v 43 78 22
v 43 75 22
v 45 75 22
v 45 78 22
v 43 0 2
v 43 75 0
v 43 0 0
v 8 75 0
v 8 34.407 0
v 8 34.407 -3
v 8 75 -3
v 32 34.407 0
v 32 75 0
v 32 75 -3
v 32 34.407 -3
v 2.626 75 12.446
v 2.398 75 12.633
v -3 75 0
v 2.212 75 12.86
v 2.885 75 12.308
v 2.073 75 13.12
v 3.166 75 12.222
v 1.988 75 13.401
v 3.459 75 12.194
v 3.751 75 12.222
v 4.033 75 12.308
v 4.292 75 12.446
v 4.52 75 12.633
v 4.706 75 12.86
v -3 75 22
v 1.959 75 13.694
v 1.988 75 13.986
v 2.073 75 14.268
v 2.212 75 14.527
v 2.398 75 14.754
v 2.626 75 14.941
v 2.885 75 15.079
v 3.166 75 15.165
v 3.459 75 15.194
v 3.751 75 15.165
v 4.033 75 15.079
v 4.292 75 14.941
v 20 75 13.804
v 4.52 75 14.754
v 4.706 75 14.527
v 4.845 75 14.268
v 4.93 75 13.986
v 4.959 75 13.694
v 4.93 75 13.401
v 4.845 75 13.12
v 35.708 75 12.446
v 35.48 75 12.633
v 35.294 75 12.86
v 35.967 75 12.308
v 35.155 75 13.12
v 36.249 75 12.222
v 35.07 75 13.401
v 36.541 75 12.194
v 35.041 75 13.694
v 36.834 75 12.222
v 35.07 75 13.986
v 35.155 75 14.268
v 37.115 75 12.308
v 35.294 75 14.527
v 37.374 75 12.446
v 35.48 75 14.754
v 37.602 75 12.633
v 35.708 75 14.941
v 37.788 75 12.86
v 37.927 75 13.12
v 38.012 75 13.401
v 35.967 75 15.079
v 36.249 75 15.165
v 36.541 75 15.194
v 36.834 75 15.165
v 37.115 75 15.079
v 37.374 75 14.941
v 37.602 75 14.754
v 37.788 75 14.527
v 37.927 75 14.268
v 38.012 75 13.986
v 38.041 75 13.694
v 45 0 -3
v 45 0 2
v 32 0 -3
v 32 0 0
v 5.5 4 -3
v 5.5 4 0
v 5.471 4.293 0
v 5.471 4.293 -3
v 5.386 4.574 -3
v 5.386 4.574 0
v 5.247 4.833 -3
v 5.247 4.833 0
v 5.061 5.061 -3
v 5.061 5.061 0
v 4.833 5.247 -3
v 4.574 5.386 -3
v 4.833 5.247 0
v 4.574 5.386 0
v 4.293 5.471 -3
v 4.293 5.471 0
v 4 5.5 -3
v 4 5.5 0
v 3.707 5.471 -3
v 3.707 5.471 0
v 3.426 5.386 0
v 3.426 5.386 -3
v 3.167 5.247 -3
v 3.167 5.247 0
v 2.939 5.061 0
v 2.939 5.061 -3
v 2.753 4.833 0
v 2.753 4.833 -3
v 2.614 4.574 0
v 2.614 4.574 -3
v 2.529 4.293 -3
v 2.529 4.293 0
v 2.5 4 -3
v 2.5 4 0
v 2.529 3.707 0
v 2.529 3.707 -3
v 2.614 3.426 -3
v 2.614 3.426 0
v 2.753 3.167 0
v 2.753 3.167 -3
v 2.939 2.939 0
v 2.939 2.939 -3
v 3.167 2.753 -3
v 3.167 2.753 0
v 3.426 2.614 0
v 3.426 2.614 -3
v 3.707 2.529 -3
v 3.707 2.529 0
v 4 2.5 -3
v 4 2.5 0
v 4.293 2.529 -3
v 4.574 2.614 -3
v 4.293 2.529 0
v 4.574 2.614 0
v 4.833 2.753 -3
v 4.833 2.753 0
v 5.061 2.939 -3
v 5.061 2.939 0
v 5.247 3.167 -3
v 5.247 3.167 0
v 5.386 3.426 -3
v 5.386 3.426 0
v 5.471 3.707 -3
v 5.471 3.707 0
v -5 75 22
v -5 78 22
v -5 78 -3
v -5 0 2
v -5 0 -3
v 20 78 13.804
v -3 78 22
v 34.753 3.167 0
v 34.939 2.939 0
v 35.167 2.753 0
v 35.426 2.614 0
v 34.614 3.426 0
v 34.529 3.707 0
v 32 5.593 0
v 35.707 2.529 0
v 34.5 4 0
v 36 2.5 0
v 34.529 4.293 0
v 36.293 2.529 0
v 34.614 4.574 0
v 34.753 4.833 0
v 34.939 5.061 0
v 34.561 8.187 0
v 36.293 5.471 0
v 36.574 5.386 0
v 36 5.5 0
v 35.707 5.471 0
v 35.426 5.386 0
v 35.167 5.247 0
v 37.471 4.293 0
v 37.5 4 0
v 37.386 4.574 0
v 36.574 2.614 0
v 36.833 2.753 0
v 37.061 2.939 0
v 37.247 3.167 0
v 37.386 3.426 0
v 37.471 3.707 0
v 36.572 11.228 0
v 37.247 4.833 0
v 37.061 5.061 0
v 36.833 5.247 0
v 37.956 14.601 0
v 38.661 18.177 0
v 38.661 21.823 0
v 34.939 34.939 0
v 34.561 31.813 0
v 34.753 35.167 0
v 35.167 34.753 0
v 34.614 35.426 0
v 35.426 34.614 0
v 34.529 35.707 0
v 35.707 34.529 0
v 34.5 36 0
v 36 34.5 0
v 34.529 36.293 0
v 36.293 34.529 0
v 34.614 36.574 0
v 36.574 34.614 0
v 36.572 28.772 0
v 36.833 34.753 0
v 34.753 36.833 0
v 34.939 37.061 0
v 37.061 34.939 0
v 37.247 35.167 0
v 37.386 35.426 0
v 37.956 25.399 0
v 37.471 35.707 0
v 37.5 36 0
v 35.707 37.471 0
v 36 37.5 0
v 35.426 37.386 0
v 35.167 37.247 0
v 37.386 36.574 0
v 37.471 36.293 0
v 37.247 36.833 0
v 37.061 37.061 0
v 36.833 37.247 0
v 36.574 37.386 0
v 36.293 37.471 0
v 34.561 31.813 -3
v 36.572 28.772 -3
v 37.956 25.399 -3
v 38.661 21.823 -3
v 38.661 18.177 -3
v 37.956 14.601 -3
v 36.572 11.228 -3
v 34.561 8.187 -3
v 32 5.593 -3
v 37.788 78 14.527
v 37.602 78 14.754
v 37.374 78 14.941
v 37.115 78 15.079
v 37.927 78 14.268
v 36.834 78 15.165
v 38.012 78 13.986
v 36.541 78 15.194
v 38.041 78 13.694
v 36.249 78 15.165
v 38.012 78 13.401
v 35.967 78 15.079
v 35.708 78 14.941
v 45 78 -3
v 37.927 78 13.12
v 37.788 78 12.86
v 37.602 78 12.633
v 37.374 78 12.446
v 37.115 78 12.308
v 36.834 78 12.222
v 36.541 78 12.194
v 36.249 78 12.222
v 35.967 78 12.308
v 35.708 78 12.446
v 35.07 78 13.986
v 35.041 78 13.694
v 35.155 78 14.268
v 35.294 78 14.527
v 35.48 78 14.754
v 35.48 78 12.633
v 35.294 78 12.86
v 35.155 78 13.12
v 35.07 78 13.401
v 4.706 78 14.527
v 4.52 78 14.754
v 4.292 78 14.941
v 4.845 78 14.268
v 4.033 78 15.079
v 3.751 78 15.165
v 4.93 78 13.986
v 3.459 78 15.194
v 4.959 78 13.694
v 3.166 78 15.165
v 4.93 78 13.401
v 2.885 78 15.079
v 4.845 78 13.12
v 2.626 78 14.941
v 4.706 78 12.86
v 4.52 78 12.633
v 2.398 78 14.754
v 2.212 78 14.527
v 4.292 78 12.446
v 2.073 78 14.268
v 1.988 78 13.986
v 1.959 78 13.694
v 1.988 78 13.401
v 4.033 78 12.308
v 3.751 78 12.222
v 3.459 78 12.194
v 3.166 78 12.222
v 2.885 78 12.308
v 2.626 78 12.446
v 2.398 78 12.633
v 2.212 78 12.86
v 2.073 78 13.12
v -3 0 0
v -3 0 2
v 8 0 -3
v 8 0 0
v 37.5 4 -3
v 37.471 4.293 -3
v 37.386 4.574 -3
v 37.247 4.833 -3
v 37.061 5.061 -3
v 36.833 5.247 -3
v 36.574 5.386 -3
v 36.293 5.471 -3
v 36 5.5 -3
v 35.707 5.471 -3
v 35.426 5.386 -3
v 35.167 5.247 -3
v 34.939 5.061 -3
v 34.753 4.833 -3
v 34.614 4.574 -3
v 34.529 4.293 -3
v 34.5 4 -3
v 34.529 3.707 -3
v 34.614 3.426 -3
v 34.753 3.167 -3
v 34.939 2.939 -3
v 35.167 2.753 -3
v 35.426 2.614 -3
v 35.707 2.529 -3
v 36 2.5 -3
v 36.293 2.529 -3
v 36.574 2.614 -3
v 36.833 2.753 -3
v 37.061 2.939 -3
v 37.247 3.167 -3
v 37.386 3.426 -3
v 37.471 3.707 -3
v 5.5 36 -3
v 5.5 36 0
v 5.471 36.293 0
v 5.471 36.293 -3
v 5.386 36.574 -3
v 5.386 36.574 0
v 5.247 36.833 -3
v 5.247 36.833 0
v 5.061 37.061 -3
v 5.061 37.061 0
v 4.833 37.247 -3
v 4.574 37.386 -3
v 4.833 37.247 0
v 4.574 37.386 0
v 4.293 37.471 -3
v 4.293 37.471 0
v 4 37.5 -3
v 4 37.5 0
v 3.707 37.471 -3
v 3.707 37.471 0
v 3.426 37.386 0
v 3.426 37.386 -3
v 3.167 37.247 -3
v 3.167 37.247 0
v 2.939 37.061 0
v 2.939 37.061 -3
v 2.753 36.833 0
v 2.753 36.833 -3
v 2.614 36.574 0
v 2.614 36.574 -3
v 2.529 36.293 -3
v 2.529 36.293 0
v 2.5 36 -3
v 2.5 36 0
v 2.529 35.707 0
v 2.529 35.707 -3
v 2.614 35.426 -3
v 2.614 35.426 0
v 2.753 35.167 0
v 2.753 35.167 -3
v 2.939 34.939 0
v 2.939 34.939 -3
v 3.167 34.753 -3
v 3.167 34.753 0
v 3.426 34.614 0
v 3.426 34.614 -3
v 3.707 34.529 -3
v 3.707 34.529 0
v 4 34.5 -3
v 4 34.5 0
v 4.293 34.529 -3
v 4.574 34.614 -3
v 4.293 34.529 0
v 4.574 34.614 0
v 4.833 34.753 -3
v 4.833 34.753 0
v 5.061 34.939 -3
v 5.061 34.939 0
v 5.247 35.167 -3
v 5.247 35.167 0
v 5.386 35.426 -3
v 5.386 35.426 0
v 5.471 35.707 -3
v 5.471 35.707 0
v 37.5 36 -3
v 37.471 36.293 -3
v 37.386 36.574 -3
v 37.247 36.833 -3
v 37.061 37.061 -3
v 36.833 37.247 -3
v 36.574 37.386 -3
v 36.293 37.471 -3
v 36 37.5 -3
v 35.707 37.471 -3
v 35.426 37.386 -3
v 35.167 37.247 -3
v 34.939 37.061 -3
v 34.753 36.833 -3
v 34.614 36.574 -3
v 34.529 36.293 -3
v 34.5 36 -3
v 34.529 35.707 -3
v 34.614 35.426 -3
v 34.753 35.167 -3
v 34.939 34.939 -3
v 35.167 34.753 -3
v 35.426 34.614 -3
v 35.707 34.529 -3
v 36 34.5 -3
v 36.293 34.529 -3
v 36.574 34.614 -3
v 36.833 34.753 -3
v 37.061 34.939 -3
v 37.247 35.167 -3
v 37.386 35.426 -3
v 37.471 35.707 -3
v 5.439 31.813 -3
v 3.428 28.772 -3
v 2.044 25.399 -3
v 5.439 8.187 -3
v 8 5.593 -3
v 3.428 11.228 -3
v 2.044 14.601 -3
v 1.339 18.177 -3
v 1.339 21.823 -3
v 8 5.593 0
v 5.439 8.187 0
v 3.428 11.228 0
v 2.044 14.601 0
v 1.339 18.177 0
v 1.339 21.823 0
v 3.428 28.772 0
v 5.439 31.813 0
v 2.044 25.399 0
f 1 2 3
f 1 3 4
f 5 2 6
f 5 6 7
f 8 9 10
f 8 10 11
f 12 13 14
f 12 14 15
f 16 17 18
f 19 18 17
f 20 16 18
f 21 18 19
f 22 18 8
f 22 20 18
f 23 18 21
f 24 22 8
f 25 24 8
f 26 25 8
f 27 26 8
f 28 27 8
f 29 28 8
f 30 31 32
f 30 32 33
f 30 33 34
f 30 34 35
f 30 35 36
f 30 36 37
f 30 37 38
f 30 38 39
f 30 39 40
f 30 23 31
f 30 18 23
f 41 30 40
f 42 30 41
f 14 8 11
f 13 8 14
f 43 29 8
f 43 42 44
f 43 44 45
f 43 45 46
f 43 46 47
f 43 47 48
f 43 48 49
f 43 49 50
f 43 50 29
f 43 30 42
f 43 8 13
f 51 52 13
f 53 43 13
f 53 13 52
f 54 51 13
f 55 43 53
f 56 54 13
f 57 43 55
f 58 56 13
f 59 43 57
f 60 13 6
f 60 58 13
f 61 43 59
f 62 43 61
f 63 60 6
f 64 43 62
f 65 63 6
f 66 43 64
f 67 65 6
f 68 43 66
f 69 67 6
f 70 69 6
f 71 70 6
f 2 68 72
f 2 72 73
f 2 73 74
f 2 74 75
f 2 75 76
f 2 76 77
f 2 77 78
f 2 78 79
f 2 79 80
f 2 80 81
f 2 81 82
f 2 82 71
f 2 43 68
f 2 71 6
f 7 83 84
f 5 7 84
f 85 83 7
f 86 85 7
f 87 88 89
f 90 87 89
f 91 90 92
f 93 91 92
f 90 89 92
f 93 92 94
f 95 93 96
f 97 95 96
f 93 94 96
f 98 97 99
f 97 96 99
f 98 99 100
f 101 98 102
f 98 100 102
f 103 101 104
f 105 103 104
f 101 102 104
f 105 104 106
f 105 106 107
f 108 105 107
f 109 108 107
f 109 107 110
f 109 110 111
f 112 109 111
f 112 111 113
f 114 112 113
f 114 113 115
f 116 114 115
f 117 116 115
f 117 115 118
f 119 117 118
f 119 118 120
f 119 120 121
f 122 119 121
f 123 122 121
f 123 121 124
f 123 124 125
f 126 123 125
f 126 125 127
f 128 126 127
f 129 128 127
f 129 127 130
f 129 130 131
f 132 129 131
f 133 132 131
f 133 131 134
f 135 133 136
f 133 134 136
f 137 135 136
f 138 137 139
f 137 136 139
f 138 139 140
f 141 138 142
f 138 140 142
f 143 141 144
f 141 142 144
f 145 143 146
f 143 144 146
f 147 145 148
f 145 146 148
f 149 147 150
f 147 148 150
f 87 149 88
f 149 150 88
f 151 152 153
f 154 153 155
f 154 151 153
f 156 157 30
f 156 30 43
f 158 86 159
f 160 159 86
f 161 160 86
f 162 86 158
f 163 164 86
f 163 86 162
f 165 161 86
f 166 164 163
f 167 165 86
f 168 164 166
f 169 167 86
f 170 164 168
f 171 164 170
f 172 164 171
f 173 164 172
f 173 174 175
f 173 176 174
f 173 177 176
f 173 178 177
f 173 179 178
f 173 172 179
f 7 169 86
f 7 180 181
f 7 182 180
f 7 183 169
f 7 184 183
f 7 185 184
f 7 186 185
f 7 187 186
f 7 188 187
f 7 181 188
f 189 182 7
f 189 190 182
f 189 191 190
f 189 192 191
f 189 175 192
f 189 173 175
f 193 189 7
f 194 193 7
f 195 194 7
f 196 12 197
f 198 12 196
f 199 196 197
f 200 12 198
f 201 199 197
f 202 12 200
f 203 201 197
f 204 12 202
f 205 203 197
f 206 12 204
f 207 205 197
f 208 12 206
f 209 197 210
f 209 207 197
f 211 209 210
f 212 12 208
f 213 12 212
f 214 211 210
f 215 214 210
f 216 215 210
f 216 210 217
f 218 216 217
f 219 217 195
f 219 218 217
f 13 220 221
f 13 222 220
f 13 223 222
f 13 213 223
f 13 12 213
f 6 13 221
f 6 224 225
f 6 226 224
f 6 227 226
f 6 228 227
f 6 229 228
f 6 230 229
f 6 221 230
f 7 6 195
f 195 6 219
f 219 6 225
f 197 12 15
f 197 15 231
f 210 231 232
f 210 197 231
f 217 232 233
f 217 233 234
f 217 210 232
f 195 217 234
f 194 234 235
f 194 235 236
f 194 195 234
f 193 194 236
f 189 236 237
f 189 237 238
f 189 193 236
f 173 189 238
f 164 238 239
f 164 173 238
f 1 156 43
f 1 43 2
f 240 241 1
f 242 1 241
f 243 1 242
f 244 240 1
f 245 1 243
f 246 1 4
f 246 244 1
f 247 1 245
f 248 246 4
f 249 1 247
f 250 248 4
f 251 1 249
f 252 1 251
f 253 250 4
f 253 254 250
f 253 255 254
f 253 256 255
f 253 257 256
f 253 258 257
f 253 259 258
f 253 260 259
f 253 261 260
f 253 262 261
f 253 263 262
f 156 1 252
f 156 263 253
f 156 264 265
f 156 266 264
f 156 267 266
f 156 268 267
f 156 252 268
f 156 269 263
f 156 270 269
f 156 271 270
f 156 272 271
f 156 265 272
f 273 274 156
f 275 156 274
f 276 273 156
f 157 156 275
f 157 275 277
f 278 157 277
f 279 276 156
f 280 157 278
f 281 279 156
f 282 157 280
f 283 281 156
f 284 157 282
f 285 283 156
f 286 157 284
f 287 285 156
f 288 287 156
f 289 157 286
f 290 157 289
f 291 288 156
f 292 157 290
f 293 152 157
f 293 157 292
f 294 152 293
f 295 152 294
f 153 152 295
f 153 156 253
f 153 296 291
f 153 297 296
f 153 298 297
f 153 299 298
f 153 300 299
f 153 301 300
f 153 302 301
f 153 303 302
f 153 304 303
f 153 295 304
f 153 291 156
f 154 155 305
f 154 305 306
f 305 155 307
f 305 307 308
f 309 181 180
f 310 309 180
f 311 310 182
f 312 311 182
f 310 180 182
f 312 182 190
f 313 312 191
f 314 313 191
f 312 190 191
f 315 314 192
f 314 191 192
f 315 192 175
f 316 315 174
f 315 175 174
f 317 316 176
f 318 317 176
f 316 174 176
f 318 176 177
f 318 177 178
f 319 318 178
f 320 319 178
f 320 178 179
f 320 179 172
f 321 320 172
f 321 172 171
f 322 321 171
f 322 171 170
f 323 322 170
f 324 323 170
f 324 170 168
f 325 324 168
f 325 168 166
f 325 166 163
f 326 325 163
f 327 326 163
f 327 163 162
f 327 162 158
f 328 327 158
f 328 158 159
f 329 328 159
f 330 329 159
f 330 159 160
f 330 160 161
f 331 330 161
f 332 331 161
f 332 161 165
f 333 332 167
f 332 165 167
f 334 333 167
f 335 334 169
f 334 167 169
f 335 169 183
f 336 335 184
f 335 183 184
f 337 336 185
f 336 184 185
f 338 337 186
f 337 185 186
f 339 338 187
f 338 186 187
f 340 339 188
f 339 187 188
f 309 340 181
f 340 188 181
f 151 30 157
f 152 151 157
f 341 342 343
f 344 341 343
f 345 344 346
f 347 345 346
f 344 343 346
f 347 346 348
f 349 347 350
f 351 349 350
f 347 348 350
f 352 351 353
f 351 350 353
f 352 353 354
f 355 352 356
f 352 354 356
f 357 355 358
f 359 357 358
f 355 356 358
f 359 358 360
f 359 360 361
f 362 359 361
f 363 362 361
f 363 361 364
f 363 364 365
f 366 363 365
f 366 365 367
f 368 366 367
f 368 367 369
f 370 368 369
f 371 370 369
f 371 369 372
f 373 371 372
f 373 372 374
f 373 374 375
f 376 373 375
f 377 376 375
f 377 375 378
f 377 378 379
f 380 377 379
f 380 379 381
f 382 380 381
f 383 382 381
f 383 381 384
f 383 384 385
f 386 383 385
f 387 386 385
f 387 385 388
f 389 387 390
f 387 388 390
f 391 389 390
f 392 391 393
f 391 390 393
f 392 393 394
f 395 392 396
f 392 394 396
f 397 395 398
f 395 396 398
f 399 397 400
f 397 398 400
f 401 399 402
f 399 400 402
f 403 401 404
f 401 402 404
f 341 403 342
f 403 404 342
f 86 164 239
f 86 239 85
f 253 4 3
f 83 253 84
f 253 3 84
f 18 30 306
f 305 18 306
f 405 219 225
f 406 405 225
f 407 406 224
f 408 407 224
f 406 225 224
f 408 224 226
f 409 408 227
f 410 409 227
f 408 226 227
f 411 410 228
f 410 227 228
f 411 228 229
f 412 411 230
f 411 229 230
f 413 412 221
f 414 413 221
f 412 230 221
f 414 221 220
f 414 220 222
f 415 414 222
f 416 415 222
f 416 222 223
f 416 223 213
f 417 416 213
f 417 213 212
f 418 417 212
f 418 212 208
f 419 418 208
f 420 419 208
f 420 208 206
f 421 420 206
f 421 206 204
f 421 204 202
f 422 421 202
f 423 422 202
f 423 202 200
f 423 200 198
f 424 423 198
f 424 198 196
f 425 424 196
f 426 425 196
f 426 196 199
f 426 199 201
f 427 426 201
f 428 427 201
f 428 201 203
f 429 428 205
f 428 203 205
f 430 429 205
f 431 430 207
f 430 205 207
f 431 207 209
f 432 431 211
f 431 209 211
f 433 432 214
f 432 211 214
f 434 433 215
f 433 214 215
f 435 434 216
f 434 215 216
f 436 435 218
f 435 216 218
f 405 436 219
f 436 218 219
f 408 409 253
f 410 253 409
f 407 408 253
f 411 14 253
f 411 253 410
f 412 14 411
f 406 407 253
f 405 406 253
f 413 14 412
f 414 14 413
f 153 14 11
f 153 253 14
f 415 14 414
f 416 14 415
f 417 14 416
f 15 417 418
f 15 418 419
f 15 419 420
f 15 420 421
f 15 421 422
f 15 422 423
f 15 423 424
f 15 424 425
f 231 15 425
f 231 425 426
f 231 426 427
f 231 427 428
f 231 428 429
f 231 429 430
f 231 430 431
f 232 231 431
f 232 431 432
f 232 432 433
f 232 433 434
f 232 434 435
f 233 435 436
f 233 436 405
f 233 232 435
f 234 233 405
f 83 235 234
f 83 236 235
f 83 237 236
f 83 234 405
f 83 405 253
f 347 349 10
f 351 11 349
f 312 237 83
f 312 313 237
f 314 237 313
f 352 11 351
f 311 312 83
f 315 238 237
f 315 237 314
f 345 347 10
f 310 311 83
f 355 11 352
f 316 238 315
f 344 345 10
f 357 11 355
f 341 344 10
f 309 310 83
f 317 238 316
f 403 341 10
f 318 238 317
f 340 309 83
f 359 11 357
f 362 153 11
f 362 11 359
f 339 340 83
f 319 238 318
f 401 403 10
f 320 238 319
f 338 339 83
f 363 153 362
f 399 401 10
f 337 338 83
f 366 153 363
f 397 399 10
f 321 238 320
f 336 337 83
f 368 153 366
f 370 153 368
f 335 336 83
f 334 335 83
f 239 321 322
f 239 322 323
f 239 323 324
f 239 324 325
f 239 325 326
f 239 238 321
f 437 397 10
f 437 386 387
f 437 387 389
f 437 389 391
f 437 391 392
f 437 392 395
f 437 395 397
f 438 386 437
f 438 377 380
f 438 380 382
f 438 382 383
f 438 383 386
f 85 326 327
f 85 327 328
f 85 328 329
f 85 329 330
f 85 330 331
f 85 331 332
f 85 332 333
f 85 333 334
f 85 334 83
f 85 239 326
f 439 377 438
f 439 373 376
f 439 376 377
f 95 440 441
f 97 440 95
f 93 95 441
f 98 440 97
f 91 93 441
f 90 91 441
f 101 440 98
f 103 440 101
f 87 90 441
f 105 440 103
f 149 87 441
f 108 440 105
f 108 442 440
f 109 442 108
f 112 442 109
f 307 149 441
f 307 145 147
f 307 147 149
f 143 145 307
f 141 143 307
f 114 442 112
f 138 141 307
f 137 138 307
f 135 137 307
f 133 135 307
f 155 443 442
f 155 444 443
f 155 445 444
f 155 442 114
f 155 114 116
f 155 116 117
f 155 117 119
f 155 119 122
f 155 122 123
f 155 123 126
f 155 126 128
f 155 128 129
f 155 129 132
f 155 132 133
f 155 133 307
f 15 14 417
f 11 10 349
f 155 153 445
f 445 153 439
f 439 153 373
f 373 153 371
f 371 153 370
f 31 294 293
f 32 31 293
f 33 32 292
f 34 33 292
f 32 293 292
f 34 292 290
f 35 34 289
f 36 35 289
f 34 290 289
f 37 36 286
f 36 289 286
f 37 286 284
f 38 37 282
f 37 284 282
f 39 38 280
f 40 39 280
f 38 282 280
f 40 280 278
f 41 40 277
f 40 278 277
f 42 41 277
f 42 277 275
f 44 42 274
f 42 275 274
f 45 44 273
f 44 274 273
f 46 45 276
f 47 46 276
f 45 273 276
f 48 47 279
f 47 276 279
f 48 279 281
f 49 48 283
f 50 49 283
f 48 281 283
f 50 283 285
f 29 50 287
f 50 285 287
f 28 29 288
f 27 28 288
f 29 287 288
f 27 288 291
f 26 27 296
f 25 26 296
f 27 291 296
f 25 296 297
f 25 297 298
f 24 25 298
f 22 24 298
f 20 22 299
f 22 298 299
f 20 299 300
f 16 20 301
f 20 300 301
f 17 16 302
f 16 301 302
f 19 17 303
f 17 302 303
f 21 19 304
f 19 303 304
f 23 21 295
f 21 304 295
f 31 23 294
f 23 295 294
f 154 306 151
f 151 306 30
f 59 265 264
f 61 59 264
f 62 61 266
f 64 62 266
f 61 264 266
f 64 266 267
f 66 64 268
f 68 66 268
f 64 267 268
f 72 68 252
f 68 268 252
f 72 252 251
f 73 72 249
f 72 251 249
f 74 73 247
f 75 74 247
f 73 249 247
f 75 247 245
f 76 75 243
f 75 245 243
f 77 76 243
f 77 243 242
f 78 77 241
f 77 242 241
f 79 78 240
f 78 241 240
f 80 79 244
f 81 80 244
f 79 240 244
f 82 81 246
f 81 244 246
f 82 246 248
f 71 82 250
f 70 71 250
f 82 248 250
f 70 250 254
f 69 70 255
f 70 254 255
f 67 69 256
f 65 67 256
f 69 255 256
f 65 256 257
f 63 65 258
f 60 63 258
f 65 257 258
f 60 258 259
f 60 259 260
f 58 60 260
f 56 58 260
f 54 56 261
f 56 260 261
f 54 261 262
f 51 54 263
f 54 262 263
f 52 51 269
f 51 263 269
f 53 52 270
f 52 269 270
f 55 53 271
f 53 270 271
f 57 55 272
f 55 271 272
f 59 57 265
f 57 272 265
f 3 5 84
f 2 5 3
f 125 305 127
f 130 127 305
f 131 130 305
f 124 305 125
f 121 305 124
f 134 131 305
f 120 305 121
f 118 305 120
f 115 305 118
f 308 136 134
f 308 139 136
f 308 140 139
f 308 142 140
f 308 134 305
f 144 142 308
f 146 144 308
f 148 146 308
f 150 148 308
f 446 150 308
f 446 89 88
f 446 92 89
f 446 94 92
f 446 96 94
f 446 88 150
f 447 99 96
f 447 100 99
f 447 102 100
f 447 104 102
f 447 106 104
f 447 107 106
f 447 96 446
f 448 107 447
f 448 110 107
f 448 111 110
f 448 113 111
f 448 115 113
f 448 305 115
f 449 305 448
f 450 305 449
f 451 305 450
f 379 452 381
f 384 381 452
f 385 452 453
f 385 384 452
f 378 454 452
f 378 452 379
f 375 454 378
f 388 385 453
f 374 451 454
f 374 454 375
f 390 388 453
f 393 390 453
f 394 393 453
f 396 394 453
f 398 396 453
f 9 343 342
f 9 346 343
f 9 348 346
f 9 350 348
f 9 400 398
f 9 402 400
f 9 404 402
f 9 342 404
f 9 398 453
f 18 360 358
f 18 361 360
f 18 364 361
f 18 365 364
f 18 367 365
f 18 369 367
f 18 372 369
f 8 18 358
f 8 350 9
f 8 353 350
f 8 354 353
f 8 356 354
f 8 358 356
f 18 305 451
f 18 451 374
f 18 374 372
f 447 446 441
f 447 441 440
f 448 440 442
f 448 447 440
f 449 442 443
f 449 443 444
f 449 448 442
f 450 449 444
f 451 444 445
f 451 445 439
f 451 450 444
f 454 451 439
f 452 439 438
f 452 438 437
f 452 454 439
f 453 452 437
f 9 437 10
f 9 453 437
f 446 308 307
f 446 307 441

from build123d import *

# Parameters (mm, degrees)
F0_R     = 1.5
F1_DEPTH = 3
F3_DEPTH = 2
F7_R     = 1.5
F8_DEPTH = 3


with BuildPart() as f1:
    # F0 (on Top) → F1 (new body)
    with BuildSketch(Plane.XY):
        with BuildLine():
            Line((8, 0), (8, 5.5929704658))
            ThreePointArc((8, 5.5929704658), (1.25, 20), (8, 34.4070295342))
            Line((8, 34.4070295342), (8, 75))
            Line((8, 75), (20, 75))
            Line((20, 75), (32, 75))
            Line((32, 75), (32, 34.4070295342))
            ThreePointArc((32, 34.4070295342), (38.75, 20), (32, 5.5929704658))
            Line((32, 5.5929704658), (32, 0))
            Line((32, 0), (43, 0))
            Line((43, 0), (43, 78))
            Line((43, 78), (20, 78))
            Line((20, 78), (-3, 78))
            Line((-3, 78), (-3, 0))
            Line((-3, 0), (8, 0))
        make_face()
        with Locations((4, 4)):
            Circle(F0_R, mode=Mode.SUBTRACT)
        with Locations((4, 36)):
            Circle(F0_R, mode=Mode.SUBTRACT)
        with Locations((36, 4)):
            Circle(F0_R, mode=Mode.SUBTRACT)
        with Locations((36, 36)):
            Circle(F0_R, mode=Mode.SUBTRACT)
    extrude(amount=-F1_DEPTH)

    # F2 (on face) → F3 (join)
    with BuildSketch(Plane(origin=(-3, 0, 0), x_dir=(0, -1, 0), z_dir=(-1, 0, 0))):
        Polygon((-78, -3), (0, -3), (0, 2), (-75, 22), (-78, 22), align=None)
    extrude(amount=F3_DEPTH)

    # F6: F1 across plane


with BuildPart() as f1_1:
    add(f1.part)
    add(f1.part.mirror(Plane.YZ.offset(20)))

    # F7 (on face) → F8 (join, through all)
    with BuildSketch(Plane(origin=(0, 78, 0), x_dir=(-1, 0, 0), z_dir=(0, 1, 0))):
        Polygon((-45, 22), (-45, -3), (5, -3), (5, 22), (3, 22), (-20, 13.8037335128), (-43, 22), align=None)
        with Locations((-36.5411415696, 13.6936744675)):
            Circle(F7_R, mode=Mode.SUBTRACT)
        with Locations((-3.4588584304, 13.6936744675)):
            Circle(F7_R, mode=Mode.SUBTRACT)
    extrude(amount=-F8_DEPTH)


solid = f1_1.part
